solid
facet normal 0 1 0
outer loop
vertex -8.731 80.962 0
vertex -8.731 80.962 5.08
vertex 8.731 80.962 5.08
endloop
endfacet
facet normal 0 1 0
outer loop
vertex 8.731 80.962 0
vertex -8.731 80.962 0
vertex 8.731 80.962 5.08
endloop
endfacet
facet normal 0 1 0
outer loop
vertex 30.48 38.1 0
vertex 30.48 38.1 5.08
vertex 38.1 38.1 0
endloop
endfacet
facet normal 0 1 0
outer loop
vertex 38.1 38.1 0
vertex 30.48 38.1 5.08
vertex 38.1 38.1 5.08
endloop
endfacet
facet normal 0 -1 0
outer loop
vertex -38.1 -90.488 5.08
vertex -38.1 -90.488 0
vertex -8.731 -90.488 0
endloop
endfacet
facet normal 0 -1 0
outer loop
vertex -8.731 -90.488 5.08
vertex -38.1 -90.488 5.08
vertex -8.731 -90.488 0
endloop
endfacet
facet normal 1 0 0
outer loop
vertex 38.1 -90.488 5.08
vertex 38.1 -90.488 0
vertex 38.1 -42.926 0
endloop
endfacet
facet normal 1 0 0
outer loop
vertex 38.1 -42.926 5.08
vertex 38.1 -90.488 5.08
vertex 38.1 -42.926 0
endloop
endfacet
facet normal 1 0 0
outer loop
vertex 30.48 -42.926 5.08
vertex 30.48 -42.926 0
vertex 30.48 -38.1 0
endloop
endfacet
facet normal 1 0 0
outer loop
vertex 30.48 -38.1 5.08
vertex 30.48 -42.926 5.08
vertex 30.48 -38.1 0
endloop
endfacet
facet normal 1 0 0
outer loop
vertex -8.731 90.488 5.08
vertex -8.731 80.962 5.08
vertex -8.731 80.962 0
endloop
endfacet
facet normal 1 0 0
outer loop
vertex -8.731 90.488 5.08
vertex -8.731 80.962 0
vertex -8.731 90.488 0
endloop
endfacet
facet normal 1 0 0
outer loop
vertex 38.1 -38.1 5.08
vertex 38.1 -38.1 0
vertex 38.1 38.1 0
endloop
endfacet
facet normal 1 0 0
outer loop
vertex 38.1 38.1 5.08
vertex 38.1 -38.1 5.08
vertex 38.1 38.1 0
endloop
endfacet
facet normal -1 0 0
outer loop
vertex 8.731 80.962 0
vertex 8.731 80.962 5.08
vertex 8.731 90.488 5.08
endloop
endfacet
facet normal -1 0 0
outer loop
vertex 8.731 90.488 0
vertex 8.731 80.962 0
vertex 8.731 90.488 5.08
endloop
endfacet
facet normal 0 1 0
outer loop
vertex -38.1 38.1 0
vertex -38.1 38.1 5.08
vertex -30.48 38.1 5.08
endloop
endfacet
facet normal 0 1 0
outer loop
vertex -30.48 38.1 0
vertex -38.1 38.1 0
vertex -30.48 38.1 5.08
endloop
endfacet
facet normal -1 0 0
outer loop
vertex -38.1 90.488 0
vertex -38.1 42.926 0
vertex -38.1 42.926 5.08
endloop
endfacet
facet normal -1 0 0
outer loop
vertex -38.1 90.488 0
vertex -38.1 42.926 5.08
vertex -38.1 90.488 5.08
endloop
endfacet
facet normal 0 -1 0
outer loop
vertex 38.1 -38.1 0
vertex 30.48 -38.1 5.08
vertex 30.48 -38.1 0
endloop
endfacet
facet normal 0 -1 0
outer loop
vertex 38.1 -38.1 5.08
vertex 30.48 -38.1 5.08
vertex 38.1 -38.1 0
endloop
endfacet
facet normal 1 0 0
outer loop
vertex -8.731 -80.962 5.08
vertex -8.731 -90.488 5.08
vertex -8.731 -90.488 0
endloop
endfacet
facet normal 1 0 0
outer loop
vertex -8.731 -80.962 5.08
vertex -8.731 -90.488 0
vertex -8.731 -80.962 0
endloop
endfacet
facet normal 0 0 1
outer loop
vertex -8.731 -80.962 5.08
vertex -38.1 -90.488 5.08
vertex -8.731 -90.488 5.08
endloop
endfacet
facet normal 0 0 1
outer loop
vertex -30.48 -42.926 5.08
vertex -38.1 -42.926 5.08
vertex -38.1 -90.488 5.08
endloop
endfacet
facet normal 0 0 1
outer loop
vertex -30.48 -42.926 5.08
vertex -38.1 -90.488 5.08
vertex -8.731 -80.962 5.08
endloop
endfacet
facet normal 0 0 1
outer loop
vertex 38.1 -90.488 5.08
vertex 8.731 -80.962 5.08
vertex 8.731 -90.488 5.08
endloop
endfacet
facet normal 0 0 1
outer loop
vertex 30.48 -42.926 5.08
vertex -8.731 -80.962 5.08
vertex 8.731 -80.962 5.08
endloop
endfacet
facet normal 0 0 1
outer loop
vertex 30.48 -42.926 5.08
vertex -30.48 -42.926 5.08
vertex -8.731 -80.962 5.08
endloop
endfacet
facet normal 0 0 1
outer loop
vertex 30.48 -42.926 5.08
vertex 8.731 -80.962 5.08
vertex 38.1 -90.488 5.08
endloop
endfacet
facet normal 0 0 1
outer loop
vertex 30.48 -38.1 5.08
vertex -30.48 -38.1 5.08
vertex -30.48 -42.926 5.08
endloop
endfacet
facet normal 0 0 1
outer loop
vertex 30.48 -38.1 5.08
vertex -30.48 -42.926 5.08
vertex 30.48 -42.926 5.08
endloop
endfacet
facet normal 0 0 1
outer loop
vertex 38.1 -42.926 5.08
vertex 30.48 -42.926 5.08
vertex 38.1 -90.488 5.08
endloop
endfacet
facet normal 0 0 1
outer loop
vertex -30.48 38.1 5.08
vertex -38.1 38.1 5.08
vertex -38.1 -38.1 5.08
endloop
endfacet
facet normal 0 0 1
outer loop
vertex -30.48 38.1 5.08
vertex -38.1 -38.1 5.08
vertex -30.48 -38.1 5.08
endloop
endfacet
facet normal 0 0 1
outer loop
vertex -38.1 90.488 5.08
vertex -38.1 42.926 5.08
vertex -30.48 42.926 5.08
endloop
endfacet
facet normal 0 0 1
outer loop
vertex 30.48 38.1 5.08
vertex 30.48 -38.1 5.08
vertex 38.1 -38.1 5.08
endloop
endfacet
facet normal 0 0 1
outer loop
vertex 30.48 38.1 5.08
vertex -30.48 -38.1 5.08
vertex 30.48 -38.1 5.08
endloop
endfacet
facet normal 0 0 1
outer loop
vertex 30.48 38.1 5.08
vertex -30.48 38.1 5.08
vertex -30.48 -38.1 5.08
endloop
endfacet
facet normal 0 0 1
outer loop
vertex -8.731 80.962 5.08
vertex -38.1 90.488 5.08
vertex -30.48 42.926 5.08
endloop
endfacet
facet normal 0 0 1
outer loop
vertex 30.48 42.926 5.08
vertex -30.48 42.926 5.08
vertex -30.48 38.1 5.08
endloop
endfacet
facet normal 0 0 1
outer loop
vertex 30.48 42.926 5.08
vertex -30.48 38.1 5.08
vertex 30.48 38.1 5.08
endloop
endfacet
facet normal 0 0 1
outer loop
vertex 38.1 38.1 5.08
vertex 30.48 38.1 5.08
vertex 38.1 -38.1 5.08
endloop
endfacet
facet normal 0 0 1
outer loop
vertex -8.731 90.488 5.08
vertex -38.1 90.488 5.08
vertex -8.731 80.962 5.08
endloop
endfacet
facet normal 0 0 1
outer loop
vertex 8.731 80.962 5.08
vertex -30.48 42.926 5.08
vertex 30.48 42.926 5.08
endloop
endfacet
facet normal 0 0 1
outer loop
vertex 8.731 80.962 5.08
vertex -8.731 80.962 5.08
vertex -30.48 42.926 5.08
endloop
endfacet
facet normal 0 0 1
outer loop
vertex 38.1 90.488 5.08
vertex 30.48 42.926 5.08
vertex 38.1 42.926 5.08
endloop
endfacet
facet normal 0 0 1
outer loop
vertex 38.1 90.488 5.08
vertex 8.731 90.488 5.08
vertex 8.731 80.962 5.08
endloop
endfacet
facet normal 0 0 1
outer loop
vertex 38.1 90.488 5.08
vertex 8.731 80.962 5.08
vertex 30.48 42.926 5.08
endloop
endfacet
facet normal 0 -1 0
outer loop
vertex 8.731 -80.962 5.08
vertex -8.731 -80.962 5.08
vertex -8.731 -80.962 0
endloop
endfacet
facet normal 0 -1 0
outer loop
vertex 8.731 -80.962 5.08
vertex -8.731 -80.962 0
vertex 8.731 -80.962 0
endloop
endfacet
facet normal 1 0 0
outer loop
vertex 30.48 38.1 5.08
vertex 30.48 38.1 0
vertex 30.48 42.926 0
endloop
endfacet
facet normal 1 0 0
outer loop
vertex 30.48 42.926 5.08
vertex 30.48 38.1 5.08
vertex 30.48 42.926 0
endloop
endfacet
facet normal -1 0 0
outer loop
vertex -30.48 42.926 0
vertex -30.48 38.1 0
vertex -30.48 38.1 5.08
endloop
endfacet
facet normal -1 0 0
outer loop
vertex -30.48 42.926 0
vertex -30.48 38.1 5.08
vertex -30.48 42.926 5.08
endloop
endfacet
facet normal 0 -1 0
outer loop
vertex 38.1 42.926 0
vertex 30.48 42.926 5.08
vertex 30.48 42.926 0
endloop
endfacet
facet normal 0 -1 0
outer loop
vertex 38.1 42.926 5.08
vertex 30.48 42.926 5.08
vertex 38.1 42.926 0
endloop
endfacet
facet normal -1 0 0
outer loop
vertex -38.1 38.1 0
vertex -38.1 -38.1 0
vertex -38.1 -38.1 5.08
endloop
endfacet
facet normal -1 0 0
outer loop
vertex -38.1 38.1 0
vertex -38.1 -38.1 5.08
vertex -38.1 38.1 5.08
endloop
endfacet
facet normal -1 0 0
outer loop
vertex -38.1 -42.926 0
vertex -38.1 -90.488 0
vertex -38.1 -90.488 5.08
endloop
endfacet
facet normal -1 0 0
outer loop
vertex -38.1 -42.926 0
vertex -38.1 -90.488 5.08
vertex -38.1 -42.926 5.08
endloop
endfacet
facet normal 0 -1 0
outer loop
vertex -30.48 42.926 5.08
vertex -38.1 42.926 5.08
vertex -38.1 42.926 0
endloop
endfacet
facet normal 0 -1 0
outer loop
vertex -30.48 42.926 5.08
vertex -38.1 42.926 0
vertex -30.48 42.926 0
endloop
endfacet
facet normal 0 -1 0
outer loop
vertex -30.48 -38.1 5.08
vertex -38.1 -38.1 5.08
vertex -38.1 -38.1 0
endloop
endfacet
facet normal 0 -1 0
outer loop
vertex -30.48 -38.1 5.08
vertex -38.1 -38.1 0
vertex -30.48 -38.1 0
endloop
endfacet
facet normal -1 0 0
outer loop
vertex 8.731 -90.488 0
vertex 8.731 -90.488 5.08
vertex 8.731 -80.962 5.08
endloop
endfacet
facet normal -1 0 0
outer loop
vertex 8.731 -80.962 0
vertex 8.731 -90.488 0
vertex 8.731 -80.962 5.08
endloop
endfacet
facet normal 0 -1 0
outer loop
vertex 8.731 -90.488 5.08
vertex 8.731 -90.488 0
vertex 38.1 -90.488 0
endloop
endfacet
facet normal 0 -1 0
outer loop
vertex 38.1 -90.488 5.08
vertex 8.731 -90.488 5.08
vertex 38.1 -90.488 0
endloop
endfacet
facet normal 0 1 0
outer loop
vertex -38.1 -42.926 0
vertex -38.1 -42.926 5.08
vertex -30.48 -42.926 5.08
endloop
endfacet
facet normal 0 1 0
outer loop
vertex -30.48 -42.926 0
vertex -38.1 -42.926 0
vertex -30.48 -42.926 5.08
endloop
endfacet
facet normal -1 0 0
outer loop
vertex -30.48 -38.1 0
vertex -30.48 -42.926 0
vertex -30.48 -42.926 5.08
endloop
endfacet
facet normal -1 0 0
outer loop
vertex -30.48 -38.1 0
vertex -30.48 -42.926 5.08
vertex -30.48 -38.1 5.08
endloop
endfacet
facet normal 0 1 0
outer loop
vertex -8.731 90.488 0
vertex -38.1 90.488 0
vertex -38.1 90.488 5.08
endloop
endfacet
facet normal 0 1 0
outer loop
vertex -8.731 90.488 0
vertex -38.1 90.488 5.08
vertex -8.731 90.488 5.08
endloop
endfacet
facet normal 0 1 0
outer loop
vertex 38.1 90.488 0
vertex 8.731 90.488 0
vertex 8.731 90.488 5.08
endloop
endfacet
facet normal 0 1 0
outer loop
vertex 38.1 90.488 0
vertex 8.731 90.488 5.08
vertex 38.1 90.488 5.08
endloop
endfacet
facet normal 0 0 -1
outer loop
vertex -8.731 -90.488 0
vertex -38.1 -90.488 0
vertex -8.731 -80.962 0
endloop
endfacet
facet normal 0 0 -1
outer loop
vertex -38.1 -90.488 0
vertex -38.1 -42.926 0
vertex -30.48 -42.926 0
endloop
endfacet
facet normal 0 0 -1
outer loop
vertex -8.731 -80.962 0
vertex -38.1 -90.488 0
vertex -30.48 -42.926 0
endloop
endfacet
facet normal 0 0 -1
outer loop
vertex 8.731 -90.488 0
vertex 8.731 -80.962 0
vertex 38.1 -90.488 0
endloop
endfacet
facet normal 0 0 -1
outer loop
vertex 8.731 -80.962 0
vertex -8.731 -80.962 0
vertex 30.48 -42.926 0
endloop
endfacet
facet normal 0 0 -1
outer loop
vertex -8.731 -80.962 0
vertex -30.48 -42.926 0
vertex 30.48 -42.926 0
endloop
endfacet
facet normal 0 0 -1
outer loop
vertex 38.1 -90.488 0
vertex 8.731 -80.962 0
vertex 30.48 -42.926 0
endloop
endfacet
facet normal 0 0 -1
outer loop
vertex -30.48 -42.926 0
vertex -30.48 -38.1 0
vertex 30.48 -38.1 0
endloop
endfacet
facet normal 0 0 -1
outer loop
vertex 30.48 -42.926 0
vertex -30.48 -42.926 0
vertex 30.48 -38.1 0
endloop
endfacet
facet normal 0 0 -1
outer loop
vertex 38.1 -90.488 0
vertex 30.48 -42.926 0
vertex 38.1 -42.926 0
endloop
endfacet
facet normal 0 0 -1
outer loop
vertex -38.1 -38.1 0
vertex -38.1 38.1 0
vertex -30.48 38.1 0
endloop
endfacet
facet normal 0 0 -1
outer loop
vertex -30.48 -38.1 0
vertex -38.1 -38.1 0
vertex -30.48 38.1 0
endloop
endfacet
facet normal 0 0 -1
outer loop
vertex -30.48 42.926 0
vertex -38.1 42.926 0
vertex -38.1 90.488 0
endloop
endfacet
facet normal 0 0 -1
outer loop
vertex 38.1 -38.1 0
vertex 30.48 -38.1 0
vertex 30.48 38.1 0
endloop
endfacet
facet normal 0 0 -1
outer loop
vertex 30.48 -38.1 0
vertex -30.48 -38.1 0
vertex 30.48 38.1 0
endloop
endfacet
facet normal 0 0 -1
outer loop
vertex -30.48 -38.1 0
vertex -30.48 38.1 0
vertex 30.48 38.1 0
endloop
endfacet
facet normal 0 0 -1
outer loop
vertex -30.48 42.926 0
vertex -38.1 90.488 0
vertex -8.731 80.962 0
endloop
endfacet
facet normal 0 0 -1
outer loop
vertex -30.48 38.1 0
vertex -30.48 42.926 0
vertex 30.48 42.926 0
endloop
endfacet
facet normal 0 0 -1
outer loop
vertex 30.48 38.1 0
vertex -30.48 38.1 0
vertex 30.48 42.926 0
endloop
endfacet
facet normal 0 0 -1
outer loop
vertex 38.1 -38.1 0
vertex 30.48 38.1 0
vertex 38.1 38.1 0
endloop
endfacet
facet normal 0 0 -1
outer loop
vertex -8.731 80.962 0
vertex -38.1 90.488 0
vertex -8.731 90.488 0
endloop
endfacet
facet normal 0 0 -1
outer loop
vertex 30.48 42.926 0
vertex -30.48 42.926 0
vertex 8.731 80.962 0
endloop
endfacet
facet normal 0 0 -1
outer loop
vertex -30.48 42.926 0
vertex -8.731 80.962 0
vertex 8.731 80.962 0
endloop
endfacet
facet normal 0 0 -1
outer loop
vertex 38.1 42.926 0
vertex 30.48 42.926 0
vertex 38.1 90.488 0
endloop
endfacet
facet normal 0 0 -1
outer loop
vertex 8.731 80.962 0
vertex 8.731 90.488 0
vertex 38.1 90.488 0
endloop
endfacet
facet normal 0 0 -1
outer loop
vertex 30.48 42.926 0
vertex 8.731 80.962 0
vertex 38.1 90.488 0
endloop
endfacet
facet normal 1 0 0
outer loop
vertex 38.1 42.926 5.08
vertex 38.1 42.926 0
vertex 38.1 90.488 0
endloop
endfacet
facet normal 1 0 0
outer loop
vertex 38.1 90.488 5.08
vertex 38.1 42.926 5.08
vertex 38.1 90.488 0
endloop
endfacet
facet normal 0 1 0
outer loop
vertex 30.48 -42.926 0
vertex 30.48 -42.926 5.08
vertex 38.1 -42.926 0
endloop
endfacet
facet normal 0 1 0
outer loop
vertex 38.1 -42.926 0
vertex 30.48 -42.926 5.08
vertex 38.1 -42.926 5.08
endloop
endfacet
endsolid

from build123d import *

# Parameters (mm, degrees)
SKETCH1_W           = 76.2
SKETCH1_H           = 180.975
BOSS_EXTRUDE1_DEPTH = 5.08
SKETCH3_W           = 17.4625
SKETCH3_H           = 9.525
CUT_EXTRUDE1_DEPTH  = 6.08
SKETCH4_W           = 7.62
SKETCH4_H           = 4.826
CUT_EXTRUDE2_DEPTH  = 6.08


with BuildPart() as part:
    # Sketch1 → Boss-Extrude1 (new body)
    with BuildSketch(Plane.XY):
        Rectangle(SKETCH1_W, SKETCH1_H)
    extrude(amount=BOSS_EXTRUDE1_DEPTH)

    # Sketch3 → Cut-Extrude1 (cut, through all)
    with BuildSketch(Plane.XY.offset(5.08)):
        with Locations((0, -85.725)):
            Rectangle(SKETCH3_W, SKETCH3_H)
        with Locations((0, 85.725)):
            Rectangle(SKETCH3_W, SKETCH3_H)
    extrude(amount=-CUT_EXTRUDE1_DEPTH, mode=Mode.SUBTRACT)

    # Sketch4 → Cut-Extrude2 (cut, through all)
    with BuildSketch(Plane.XY.offset(5.08)):
        with Locations((-34.29, 40.513)):
            Rectangle(SKETCH4_W, SKETCH4_H)
        with Locations((34.29, 40.513)):
            Rectangle(SKETCH4_W, SKETCH4_H)
        with Locations((34.29, -40.513)):
            Rectangle(SKETCH4_W, SKETCH4_H)
        with Locations((-34.29, -40.513)):
            Rectangle(SKETCH4_W, SKETCH4_H)
    extrude(amount=-CUT_EXTRUDE2_DEPTH, mode=Mode.SUBTRACT)


solid = part.part
